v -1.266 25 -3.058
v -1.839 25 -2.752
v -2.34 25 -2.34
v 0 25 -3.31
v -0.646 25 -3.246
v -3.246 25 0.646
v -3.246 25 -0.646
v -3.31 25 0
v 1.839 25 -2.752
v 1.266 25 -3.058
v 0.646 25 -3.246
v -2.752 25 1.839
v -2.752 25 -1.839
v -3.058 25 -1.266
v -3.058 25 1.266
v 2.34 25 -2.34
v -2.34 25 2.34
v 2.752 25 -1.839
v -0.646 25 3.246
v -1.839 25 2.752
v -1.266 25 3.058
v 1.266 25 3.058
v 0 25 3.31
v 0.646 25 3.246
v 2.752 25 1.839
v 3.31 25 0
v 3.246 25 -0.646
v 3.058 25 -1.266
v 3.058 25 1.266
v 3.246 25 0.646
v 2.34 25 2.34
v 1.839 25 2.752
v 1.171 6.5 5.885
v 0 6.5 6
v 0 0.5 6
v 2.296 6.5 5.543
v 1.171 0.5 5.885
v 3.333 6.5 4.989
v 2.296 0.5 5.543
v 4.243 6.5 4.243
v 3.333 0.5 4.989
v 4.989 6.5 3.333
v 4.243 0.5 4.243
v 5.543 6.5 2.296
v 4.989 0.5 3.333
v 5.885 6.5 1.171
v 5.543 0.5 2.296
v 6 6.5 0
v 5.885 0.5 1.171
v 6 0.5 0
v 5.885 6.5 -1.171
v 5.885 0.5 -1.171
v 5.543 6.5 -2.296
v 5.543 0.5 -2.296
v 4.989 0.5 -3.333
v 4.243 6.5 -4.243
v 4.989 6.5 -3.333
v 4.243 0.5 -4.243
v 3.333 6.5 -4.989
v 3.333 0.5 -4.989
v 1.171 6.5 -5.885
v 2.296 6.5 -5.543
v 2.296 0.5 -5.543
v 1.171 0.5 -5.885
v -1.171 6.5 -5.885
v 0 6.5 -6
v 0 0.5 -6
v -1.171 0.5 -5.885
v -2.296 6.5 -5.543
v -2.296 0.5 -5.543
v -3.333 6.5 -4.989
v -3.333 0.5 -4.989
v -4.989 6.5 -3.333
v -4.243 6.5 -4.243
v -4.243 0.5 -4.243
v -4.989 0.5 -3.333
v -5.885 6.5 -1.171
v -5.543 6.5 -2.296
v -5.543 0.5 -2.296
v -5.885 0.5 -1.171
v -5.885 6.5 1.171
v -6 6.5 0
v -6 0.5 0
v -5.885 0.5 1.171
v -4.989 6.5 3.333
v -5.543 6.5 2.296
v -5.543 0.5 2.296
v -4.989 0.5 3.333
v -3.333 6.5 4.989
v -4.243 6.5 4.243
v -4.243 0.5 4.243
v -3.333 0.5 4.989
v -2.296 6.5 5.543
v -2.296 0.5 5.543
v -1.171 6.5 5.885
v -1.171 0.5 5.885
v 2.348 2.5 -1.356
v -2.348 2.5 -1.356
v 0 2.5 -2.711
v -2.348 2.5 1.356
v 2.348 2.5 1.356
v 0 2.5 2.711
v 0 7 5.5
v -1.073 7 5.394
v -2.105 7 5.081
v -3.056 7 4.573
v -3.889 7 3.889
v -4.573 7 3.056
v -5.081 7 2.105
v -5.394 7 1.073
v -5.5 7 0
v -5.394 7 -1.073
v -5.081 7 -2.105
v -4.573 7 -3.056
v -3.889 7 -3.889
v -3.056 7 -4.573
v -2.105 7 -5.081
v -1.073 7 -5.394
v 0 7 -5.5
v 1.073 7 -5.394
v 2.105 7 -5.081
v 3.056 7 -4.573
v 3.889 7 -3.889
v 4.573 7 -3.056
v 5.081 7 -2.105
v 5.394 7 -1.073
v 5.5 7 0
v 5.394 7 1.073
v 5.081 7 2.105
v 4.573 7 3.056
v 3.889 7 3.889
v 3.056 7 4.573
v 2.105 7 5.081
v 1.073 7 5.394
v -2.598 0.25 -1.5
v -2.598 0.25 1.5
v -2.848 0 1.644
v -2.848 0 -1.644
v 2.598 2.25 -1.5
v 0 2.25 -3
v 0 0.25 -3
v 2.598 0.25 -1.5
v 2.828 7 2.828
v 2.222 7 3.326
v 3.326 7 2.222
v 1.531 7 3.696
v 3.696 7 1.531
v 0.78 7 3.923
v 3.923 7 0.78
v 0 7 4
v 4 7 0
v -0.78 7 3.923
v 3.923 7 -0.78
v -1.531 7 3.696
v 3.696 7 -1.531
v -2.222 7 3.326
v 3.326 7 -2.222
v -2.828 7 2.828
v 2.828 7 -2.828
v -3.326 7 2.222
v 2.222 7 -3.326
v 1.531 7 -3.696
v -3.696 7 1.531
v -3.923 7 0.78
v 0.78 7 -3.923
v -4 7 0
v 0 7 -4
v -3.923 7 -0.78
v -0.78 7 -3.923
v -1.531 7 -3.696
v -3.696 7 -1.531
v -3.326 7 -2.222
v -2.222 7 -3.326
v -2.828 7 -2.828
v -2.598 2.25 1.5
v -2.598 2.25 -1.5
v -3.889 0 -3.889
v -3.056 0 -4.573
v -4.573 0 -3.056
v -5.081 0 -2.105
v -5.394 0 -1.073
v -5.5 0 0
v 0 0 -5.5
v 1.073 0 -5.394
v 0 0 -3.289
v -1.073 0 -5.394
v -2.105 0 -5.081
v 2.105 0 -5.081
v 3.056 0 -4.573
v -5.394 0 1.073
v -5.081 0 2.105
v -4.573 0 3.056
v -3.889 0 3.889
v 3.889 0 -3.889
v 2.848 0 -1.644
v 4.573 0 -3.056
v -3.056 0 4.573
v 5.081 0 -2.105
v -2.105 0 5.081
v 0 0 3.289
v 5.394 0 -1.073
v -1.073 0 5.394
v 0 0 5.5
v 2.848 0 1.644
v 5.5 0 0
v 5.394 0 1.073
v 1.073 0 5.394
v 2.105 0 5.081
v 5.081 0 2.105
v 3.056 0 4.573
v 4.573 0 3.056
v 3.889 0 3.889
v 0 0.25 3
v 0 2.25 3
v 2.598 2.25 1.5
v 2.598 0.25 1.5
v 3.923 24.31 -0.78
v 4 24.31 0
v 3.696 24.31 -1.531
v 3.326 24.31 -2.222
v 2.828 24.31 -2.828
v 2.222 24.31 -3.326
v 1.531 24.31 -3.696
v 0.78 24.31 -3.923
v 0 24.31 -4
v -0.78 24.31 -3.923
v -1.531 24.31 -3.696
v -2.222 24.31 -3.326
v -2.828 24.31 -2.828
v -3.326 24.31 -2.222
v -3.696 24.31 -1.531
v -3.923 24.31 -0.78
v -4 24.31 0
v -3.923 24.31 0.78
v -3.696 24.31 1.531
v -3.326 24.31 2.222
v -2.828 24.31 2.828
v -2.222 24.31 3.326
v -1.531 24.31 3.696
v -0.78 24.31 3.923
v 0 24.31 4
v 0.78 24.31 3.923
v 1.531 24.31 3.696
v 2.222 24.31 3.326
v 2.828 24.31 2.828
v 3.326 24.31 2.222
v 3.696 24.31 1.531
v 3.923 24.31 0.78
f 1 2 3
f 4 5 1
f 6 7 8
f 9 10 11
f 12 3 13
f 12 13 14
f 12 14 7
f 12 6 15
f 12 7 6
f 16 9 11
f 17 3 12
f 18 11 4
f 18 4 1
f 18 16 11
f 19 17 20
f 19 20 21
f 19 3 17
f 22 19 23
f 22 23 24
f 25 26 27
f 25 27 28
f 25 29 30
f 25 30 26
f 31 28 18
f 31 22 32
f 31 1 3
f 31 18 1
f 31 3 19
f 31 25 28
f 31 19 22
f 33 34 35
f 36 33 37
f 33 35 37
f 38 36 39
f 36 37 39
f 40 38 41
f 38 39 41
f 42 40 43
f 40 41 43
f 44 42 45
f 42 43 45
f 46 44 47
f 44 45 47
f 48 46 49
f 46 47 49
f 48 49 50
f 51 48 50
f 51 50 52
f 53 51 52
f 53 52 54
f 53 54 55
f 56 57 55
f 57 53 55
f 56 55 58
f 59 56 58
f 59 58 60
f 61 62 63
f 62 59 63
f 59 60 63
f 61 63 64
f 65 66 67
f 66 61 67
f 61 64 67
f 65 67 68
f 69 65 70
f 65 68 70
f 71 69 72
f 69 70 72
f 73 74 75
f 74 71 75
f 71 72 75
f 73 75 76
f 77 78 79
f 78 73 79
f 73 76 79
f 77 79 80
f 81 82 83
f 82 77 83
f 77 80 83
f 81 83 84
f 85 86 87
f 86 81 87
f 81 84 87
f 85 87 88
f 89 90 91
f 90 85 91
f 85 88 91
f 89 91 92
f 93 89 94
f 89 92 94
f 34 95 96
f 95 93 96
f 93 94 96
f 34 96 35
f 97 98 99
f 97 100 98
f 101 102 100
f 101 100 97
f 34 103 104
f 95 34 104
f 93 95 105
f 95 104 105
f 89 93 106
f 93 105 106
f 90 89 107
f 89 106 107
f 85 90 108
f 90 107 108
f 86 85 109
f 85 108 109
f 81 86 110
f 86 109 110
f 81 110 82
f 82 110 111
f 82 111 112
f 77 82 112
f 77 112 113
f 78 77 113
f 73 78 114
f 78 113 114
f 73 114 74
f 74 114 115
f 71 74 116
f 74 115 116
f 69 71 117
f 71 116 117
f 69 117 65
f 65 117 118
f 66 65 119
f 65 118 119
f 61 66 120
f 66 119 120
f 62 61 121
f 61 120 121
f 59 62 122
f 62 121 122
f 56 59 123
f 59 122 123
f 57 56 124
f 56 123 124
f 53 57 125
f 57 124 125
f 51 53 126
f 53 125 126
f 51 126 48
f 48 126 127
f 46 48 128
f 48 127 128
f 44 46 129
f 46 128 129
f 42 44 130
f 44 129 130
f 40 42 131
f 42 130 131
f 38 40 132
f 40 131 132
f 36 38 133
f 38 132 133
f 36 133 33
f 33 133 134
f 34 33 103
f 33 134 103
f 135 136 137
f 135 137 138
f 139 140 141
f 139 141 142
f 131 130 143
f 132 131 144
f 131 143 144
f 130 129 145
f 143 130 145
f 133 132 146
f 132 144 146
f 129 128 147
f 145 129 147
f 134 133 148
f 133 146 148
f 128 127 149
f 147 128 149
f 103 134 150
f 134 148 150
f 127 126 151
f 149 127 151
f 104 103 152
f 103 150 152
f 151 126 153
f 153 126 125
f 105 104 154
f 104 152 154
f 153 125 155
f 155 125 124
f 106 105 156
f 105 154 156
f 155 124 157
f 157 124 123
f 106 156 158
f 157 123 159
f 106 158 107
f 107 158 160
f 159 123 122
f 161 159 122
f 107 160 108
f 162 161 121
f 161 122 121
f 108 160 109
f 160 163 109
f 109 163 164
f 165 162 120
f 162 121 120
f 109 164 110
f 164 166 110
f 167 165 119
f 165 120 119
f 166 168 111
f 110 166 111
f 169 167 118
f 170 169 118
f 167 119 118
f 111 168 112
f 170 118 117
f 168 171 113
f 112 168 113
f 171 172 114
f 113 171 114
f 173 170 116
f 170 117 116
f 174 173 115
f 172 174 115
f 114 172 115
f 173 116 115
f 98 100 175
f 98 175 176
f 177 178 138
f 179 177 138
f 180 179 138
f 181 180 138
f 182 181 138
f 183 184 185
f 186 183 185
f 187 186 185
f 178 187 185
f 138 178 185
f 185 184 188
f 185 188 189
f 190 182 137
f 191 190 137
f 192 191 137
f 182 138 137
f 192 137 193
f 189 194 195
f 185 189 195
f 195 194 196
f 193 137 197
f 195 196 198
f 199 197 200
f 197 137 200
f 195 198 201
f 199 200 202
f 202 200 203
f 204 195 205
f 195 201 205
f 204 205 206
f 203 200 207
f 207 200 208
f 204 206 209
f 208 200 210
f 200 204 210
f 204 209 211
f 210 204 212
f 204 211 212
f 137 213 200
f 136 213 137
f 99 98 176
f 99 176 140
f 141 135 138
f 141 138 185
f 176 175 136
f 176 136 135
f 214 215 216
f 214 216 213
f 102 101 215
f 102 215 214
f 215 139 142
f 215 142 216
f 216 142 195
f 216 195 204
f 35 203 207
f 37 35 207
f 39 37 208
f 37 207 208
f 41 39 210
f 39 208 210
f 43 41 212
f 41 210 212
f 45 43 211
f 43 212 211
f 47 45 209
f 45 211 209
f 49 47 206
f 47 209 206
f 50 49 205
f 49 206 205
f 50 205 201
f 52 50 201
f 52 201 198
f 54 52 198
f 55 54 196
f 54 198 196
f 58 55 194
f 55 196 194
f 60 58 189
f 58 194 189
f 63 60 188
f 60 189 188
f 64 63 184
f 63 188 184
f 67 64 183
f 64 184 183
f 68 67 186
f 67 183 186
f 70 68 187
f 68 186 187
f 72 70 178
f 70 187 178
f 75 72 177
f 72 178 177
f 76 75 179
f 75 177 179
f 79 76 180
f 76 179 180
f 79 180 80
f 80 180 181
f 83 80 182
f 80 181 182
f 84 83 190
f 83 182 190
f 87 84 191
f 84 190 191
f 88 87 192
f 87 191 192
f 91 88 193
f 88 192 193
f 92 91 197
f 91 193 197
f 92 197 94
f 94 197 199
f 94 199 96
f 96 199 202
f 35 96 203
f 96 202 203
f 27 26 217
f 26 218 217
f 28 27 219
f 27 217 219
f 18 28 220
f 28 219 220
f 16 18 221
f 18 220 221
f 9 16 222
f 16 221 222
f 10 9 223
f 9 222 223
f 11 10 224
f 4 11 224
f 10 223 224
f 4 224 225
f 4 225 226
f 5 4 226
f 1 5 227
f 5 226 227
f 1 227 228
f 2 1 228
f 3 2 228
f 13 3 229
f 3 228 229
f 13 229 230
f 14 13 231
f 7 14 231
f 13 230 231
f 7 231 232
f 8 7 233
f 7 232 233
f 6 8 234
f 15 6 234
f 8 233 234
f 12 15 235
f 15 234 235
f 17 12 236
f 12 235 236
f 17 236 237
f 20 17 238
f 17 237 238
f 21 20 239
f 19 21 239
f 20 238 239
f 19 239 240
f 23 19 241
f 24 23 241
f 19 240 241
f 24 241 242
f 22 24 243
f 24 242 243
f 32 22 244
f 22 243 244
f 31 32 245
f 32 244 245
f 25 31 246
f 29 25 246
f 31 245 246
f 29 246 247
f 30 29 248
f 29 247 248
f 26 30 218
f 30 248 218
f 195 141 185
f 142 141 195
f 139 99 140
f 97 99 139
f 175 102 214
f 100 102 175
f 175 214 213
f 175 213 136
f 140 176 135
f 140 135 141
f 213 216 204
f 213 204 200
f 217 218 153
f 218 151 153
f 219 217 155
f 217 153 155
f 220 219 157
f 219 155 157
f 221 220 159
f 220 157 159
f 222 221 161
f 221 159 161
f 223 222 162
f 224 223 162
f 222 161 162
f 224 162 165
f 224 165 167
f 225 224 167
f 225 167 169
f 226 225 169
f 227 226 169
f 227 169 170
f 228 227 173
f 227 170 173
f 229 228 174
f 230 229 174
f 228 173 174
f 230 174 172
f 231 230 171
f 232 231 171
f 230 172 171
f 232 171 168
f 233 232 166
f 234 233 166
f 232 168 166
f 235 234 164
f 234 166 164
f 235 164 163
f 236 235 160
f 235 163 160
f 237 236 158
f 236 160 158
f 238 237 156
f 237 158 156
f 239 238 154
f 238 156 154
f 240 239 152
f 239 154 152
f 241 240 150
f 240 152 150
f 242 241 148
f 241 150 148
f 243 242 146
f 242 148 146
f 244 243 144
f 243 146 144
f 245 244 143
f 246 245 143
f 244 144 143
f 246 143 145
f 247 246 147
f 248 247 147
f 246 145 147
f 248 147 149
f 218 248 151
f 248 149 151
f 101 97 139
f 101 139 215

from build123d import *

# Parameters (mm, degrees)
SKETCH1_R               = 6
BOSS_EXTRUDE1_DEPTH     = 25
CHAMFER1_SIZE           = 0.5
CUT_EXTRUDE1_DEPTH      = 27.400757565
CUT_EXTRUDE1_DEPTH_BACK = 2.5
CHAMFER2_SIZE           = 0.25


# Read off the part's stored shape, not the designer's step: M8x1.25 Machine Threads Stud2
with BuildPart() as part:
    # Sketch1 → Boss-Extrude1 (new body)
    with BuildSketch(Plane(origin=(0, 0, 0), x_dir=(1, 0, 0), z_dir=(0, 1, 0))):
        with Locations(Location((0, 0, 0), (0, 0, 270))):
            Circle(SKETCH1_R)
    extrude(amount=BOSS_EXTRUDE1_DEPTH)

    # M8x1.25 Machine Threads Stud2 outline → M8x1.25 Machine Threads Stud2 (revolve, cut)
    with BuildSketch(Plane.XY):
        Polygon((6, 25), (3.3095, 25), (4, 24.3095), (4, 7), (6, 7), align=None)
    revolve(axis=Axis((0, 0, 0), (0, 1, 0)), mode=Mode.SUBTRACT)

    # Chamfer1
    chamfer1_edges = [part.edges().sort_by_distance(p)[0] for p in [
        (0, 0, -6),
        (0, 7, -6),
    ]]
    chamfer(chamfer1_edges, length=CHAMFER1_SIZE)

    # Sketch6 → Cut-Extrude1 (cut, two sides: drawn at the far end of the back side and taken through both)
    with BuildSketch(Plane.XZ.offset(-CUT_EXTRUDE1_DEPTH_BACK)):
        Polygon((0, -3), (2.598076211, -1.5), (2.598076211, 1.5), (0, 3), (-2.598076211, 1.5), (-2.598076211, -1.5), align=None)
    extrude(amount=CUT_EXTRUDE1_DEPTH + CUT_EXTRUDE1_DEPTH_BACK, mode=Mode.SUBTRACT)

    # Chamfer2
    chamfer2_edges = [part.edges().sort_by_distance(p)[0] for p in [
        (-2.598076211, 0, 0),
        (-1.299038106, 0, 2.25),
        (1.299038106, 0, 2.25),
        (2.598076211, 0, 0),
        (1.299038106, 0, -2.25),
        (-1.299038106, 0, -2.25),
        (-1.299038106, 2.5, -2.25),
        (1.299038106, 2.5, -2.25),
        (2.598076211, 2.5, 0),
        (1.299038106, 2.5, 2.25),
        (-1.299038106, 2.5, 2.25),
        (-2.598076211, 2.5, 0),
    ]]
    chamfer(chamfer2_edges, length=CHAMFER2_SIZE)


solid = part.part
